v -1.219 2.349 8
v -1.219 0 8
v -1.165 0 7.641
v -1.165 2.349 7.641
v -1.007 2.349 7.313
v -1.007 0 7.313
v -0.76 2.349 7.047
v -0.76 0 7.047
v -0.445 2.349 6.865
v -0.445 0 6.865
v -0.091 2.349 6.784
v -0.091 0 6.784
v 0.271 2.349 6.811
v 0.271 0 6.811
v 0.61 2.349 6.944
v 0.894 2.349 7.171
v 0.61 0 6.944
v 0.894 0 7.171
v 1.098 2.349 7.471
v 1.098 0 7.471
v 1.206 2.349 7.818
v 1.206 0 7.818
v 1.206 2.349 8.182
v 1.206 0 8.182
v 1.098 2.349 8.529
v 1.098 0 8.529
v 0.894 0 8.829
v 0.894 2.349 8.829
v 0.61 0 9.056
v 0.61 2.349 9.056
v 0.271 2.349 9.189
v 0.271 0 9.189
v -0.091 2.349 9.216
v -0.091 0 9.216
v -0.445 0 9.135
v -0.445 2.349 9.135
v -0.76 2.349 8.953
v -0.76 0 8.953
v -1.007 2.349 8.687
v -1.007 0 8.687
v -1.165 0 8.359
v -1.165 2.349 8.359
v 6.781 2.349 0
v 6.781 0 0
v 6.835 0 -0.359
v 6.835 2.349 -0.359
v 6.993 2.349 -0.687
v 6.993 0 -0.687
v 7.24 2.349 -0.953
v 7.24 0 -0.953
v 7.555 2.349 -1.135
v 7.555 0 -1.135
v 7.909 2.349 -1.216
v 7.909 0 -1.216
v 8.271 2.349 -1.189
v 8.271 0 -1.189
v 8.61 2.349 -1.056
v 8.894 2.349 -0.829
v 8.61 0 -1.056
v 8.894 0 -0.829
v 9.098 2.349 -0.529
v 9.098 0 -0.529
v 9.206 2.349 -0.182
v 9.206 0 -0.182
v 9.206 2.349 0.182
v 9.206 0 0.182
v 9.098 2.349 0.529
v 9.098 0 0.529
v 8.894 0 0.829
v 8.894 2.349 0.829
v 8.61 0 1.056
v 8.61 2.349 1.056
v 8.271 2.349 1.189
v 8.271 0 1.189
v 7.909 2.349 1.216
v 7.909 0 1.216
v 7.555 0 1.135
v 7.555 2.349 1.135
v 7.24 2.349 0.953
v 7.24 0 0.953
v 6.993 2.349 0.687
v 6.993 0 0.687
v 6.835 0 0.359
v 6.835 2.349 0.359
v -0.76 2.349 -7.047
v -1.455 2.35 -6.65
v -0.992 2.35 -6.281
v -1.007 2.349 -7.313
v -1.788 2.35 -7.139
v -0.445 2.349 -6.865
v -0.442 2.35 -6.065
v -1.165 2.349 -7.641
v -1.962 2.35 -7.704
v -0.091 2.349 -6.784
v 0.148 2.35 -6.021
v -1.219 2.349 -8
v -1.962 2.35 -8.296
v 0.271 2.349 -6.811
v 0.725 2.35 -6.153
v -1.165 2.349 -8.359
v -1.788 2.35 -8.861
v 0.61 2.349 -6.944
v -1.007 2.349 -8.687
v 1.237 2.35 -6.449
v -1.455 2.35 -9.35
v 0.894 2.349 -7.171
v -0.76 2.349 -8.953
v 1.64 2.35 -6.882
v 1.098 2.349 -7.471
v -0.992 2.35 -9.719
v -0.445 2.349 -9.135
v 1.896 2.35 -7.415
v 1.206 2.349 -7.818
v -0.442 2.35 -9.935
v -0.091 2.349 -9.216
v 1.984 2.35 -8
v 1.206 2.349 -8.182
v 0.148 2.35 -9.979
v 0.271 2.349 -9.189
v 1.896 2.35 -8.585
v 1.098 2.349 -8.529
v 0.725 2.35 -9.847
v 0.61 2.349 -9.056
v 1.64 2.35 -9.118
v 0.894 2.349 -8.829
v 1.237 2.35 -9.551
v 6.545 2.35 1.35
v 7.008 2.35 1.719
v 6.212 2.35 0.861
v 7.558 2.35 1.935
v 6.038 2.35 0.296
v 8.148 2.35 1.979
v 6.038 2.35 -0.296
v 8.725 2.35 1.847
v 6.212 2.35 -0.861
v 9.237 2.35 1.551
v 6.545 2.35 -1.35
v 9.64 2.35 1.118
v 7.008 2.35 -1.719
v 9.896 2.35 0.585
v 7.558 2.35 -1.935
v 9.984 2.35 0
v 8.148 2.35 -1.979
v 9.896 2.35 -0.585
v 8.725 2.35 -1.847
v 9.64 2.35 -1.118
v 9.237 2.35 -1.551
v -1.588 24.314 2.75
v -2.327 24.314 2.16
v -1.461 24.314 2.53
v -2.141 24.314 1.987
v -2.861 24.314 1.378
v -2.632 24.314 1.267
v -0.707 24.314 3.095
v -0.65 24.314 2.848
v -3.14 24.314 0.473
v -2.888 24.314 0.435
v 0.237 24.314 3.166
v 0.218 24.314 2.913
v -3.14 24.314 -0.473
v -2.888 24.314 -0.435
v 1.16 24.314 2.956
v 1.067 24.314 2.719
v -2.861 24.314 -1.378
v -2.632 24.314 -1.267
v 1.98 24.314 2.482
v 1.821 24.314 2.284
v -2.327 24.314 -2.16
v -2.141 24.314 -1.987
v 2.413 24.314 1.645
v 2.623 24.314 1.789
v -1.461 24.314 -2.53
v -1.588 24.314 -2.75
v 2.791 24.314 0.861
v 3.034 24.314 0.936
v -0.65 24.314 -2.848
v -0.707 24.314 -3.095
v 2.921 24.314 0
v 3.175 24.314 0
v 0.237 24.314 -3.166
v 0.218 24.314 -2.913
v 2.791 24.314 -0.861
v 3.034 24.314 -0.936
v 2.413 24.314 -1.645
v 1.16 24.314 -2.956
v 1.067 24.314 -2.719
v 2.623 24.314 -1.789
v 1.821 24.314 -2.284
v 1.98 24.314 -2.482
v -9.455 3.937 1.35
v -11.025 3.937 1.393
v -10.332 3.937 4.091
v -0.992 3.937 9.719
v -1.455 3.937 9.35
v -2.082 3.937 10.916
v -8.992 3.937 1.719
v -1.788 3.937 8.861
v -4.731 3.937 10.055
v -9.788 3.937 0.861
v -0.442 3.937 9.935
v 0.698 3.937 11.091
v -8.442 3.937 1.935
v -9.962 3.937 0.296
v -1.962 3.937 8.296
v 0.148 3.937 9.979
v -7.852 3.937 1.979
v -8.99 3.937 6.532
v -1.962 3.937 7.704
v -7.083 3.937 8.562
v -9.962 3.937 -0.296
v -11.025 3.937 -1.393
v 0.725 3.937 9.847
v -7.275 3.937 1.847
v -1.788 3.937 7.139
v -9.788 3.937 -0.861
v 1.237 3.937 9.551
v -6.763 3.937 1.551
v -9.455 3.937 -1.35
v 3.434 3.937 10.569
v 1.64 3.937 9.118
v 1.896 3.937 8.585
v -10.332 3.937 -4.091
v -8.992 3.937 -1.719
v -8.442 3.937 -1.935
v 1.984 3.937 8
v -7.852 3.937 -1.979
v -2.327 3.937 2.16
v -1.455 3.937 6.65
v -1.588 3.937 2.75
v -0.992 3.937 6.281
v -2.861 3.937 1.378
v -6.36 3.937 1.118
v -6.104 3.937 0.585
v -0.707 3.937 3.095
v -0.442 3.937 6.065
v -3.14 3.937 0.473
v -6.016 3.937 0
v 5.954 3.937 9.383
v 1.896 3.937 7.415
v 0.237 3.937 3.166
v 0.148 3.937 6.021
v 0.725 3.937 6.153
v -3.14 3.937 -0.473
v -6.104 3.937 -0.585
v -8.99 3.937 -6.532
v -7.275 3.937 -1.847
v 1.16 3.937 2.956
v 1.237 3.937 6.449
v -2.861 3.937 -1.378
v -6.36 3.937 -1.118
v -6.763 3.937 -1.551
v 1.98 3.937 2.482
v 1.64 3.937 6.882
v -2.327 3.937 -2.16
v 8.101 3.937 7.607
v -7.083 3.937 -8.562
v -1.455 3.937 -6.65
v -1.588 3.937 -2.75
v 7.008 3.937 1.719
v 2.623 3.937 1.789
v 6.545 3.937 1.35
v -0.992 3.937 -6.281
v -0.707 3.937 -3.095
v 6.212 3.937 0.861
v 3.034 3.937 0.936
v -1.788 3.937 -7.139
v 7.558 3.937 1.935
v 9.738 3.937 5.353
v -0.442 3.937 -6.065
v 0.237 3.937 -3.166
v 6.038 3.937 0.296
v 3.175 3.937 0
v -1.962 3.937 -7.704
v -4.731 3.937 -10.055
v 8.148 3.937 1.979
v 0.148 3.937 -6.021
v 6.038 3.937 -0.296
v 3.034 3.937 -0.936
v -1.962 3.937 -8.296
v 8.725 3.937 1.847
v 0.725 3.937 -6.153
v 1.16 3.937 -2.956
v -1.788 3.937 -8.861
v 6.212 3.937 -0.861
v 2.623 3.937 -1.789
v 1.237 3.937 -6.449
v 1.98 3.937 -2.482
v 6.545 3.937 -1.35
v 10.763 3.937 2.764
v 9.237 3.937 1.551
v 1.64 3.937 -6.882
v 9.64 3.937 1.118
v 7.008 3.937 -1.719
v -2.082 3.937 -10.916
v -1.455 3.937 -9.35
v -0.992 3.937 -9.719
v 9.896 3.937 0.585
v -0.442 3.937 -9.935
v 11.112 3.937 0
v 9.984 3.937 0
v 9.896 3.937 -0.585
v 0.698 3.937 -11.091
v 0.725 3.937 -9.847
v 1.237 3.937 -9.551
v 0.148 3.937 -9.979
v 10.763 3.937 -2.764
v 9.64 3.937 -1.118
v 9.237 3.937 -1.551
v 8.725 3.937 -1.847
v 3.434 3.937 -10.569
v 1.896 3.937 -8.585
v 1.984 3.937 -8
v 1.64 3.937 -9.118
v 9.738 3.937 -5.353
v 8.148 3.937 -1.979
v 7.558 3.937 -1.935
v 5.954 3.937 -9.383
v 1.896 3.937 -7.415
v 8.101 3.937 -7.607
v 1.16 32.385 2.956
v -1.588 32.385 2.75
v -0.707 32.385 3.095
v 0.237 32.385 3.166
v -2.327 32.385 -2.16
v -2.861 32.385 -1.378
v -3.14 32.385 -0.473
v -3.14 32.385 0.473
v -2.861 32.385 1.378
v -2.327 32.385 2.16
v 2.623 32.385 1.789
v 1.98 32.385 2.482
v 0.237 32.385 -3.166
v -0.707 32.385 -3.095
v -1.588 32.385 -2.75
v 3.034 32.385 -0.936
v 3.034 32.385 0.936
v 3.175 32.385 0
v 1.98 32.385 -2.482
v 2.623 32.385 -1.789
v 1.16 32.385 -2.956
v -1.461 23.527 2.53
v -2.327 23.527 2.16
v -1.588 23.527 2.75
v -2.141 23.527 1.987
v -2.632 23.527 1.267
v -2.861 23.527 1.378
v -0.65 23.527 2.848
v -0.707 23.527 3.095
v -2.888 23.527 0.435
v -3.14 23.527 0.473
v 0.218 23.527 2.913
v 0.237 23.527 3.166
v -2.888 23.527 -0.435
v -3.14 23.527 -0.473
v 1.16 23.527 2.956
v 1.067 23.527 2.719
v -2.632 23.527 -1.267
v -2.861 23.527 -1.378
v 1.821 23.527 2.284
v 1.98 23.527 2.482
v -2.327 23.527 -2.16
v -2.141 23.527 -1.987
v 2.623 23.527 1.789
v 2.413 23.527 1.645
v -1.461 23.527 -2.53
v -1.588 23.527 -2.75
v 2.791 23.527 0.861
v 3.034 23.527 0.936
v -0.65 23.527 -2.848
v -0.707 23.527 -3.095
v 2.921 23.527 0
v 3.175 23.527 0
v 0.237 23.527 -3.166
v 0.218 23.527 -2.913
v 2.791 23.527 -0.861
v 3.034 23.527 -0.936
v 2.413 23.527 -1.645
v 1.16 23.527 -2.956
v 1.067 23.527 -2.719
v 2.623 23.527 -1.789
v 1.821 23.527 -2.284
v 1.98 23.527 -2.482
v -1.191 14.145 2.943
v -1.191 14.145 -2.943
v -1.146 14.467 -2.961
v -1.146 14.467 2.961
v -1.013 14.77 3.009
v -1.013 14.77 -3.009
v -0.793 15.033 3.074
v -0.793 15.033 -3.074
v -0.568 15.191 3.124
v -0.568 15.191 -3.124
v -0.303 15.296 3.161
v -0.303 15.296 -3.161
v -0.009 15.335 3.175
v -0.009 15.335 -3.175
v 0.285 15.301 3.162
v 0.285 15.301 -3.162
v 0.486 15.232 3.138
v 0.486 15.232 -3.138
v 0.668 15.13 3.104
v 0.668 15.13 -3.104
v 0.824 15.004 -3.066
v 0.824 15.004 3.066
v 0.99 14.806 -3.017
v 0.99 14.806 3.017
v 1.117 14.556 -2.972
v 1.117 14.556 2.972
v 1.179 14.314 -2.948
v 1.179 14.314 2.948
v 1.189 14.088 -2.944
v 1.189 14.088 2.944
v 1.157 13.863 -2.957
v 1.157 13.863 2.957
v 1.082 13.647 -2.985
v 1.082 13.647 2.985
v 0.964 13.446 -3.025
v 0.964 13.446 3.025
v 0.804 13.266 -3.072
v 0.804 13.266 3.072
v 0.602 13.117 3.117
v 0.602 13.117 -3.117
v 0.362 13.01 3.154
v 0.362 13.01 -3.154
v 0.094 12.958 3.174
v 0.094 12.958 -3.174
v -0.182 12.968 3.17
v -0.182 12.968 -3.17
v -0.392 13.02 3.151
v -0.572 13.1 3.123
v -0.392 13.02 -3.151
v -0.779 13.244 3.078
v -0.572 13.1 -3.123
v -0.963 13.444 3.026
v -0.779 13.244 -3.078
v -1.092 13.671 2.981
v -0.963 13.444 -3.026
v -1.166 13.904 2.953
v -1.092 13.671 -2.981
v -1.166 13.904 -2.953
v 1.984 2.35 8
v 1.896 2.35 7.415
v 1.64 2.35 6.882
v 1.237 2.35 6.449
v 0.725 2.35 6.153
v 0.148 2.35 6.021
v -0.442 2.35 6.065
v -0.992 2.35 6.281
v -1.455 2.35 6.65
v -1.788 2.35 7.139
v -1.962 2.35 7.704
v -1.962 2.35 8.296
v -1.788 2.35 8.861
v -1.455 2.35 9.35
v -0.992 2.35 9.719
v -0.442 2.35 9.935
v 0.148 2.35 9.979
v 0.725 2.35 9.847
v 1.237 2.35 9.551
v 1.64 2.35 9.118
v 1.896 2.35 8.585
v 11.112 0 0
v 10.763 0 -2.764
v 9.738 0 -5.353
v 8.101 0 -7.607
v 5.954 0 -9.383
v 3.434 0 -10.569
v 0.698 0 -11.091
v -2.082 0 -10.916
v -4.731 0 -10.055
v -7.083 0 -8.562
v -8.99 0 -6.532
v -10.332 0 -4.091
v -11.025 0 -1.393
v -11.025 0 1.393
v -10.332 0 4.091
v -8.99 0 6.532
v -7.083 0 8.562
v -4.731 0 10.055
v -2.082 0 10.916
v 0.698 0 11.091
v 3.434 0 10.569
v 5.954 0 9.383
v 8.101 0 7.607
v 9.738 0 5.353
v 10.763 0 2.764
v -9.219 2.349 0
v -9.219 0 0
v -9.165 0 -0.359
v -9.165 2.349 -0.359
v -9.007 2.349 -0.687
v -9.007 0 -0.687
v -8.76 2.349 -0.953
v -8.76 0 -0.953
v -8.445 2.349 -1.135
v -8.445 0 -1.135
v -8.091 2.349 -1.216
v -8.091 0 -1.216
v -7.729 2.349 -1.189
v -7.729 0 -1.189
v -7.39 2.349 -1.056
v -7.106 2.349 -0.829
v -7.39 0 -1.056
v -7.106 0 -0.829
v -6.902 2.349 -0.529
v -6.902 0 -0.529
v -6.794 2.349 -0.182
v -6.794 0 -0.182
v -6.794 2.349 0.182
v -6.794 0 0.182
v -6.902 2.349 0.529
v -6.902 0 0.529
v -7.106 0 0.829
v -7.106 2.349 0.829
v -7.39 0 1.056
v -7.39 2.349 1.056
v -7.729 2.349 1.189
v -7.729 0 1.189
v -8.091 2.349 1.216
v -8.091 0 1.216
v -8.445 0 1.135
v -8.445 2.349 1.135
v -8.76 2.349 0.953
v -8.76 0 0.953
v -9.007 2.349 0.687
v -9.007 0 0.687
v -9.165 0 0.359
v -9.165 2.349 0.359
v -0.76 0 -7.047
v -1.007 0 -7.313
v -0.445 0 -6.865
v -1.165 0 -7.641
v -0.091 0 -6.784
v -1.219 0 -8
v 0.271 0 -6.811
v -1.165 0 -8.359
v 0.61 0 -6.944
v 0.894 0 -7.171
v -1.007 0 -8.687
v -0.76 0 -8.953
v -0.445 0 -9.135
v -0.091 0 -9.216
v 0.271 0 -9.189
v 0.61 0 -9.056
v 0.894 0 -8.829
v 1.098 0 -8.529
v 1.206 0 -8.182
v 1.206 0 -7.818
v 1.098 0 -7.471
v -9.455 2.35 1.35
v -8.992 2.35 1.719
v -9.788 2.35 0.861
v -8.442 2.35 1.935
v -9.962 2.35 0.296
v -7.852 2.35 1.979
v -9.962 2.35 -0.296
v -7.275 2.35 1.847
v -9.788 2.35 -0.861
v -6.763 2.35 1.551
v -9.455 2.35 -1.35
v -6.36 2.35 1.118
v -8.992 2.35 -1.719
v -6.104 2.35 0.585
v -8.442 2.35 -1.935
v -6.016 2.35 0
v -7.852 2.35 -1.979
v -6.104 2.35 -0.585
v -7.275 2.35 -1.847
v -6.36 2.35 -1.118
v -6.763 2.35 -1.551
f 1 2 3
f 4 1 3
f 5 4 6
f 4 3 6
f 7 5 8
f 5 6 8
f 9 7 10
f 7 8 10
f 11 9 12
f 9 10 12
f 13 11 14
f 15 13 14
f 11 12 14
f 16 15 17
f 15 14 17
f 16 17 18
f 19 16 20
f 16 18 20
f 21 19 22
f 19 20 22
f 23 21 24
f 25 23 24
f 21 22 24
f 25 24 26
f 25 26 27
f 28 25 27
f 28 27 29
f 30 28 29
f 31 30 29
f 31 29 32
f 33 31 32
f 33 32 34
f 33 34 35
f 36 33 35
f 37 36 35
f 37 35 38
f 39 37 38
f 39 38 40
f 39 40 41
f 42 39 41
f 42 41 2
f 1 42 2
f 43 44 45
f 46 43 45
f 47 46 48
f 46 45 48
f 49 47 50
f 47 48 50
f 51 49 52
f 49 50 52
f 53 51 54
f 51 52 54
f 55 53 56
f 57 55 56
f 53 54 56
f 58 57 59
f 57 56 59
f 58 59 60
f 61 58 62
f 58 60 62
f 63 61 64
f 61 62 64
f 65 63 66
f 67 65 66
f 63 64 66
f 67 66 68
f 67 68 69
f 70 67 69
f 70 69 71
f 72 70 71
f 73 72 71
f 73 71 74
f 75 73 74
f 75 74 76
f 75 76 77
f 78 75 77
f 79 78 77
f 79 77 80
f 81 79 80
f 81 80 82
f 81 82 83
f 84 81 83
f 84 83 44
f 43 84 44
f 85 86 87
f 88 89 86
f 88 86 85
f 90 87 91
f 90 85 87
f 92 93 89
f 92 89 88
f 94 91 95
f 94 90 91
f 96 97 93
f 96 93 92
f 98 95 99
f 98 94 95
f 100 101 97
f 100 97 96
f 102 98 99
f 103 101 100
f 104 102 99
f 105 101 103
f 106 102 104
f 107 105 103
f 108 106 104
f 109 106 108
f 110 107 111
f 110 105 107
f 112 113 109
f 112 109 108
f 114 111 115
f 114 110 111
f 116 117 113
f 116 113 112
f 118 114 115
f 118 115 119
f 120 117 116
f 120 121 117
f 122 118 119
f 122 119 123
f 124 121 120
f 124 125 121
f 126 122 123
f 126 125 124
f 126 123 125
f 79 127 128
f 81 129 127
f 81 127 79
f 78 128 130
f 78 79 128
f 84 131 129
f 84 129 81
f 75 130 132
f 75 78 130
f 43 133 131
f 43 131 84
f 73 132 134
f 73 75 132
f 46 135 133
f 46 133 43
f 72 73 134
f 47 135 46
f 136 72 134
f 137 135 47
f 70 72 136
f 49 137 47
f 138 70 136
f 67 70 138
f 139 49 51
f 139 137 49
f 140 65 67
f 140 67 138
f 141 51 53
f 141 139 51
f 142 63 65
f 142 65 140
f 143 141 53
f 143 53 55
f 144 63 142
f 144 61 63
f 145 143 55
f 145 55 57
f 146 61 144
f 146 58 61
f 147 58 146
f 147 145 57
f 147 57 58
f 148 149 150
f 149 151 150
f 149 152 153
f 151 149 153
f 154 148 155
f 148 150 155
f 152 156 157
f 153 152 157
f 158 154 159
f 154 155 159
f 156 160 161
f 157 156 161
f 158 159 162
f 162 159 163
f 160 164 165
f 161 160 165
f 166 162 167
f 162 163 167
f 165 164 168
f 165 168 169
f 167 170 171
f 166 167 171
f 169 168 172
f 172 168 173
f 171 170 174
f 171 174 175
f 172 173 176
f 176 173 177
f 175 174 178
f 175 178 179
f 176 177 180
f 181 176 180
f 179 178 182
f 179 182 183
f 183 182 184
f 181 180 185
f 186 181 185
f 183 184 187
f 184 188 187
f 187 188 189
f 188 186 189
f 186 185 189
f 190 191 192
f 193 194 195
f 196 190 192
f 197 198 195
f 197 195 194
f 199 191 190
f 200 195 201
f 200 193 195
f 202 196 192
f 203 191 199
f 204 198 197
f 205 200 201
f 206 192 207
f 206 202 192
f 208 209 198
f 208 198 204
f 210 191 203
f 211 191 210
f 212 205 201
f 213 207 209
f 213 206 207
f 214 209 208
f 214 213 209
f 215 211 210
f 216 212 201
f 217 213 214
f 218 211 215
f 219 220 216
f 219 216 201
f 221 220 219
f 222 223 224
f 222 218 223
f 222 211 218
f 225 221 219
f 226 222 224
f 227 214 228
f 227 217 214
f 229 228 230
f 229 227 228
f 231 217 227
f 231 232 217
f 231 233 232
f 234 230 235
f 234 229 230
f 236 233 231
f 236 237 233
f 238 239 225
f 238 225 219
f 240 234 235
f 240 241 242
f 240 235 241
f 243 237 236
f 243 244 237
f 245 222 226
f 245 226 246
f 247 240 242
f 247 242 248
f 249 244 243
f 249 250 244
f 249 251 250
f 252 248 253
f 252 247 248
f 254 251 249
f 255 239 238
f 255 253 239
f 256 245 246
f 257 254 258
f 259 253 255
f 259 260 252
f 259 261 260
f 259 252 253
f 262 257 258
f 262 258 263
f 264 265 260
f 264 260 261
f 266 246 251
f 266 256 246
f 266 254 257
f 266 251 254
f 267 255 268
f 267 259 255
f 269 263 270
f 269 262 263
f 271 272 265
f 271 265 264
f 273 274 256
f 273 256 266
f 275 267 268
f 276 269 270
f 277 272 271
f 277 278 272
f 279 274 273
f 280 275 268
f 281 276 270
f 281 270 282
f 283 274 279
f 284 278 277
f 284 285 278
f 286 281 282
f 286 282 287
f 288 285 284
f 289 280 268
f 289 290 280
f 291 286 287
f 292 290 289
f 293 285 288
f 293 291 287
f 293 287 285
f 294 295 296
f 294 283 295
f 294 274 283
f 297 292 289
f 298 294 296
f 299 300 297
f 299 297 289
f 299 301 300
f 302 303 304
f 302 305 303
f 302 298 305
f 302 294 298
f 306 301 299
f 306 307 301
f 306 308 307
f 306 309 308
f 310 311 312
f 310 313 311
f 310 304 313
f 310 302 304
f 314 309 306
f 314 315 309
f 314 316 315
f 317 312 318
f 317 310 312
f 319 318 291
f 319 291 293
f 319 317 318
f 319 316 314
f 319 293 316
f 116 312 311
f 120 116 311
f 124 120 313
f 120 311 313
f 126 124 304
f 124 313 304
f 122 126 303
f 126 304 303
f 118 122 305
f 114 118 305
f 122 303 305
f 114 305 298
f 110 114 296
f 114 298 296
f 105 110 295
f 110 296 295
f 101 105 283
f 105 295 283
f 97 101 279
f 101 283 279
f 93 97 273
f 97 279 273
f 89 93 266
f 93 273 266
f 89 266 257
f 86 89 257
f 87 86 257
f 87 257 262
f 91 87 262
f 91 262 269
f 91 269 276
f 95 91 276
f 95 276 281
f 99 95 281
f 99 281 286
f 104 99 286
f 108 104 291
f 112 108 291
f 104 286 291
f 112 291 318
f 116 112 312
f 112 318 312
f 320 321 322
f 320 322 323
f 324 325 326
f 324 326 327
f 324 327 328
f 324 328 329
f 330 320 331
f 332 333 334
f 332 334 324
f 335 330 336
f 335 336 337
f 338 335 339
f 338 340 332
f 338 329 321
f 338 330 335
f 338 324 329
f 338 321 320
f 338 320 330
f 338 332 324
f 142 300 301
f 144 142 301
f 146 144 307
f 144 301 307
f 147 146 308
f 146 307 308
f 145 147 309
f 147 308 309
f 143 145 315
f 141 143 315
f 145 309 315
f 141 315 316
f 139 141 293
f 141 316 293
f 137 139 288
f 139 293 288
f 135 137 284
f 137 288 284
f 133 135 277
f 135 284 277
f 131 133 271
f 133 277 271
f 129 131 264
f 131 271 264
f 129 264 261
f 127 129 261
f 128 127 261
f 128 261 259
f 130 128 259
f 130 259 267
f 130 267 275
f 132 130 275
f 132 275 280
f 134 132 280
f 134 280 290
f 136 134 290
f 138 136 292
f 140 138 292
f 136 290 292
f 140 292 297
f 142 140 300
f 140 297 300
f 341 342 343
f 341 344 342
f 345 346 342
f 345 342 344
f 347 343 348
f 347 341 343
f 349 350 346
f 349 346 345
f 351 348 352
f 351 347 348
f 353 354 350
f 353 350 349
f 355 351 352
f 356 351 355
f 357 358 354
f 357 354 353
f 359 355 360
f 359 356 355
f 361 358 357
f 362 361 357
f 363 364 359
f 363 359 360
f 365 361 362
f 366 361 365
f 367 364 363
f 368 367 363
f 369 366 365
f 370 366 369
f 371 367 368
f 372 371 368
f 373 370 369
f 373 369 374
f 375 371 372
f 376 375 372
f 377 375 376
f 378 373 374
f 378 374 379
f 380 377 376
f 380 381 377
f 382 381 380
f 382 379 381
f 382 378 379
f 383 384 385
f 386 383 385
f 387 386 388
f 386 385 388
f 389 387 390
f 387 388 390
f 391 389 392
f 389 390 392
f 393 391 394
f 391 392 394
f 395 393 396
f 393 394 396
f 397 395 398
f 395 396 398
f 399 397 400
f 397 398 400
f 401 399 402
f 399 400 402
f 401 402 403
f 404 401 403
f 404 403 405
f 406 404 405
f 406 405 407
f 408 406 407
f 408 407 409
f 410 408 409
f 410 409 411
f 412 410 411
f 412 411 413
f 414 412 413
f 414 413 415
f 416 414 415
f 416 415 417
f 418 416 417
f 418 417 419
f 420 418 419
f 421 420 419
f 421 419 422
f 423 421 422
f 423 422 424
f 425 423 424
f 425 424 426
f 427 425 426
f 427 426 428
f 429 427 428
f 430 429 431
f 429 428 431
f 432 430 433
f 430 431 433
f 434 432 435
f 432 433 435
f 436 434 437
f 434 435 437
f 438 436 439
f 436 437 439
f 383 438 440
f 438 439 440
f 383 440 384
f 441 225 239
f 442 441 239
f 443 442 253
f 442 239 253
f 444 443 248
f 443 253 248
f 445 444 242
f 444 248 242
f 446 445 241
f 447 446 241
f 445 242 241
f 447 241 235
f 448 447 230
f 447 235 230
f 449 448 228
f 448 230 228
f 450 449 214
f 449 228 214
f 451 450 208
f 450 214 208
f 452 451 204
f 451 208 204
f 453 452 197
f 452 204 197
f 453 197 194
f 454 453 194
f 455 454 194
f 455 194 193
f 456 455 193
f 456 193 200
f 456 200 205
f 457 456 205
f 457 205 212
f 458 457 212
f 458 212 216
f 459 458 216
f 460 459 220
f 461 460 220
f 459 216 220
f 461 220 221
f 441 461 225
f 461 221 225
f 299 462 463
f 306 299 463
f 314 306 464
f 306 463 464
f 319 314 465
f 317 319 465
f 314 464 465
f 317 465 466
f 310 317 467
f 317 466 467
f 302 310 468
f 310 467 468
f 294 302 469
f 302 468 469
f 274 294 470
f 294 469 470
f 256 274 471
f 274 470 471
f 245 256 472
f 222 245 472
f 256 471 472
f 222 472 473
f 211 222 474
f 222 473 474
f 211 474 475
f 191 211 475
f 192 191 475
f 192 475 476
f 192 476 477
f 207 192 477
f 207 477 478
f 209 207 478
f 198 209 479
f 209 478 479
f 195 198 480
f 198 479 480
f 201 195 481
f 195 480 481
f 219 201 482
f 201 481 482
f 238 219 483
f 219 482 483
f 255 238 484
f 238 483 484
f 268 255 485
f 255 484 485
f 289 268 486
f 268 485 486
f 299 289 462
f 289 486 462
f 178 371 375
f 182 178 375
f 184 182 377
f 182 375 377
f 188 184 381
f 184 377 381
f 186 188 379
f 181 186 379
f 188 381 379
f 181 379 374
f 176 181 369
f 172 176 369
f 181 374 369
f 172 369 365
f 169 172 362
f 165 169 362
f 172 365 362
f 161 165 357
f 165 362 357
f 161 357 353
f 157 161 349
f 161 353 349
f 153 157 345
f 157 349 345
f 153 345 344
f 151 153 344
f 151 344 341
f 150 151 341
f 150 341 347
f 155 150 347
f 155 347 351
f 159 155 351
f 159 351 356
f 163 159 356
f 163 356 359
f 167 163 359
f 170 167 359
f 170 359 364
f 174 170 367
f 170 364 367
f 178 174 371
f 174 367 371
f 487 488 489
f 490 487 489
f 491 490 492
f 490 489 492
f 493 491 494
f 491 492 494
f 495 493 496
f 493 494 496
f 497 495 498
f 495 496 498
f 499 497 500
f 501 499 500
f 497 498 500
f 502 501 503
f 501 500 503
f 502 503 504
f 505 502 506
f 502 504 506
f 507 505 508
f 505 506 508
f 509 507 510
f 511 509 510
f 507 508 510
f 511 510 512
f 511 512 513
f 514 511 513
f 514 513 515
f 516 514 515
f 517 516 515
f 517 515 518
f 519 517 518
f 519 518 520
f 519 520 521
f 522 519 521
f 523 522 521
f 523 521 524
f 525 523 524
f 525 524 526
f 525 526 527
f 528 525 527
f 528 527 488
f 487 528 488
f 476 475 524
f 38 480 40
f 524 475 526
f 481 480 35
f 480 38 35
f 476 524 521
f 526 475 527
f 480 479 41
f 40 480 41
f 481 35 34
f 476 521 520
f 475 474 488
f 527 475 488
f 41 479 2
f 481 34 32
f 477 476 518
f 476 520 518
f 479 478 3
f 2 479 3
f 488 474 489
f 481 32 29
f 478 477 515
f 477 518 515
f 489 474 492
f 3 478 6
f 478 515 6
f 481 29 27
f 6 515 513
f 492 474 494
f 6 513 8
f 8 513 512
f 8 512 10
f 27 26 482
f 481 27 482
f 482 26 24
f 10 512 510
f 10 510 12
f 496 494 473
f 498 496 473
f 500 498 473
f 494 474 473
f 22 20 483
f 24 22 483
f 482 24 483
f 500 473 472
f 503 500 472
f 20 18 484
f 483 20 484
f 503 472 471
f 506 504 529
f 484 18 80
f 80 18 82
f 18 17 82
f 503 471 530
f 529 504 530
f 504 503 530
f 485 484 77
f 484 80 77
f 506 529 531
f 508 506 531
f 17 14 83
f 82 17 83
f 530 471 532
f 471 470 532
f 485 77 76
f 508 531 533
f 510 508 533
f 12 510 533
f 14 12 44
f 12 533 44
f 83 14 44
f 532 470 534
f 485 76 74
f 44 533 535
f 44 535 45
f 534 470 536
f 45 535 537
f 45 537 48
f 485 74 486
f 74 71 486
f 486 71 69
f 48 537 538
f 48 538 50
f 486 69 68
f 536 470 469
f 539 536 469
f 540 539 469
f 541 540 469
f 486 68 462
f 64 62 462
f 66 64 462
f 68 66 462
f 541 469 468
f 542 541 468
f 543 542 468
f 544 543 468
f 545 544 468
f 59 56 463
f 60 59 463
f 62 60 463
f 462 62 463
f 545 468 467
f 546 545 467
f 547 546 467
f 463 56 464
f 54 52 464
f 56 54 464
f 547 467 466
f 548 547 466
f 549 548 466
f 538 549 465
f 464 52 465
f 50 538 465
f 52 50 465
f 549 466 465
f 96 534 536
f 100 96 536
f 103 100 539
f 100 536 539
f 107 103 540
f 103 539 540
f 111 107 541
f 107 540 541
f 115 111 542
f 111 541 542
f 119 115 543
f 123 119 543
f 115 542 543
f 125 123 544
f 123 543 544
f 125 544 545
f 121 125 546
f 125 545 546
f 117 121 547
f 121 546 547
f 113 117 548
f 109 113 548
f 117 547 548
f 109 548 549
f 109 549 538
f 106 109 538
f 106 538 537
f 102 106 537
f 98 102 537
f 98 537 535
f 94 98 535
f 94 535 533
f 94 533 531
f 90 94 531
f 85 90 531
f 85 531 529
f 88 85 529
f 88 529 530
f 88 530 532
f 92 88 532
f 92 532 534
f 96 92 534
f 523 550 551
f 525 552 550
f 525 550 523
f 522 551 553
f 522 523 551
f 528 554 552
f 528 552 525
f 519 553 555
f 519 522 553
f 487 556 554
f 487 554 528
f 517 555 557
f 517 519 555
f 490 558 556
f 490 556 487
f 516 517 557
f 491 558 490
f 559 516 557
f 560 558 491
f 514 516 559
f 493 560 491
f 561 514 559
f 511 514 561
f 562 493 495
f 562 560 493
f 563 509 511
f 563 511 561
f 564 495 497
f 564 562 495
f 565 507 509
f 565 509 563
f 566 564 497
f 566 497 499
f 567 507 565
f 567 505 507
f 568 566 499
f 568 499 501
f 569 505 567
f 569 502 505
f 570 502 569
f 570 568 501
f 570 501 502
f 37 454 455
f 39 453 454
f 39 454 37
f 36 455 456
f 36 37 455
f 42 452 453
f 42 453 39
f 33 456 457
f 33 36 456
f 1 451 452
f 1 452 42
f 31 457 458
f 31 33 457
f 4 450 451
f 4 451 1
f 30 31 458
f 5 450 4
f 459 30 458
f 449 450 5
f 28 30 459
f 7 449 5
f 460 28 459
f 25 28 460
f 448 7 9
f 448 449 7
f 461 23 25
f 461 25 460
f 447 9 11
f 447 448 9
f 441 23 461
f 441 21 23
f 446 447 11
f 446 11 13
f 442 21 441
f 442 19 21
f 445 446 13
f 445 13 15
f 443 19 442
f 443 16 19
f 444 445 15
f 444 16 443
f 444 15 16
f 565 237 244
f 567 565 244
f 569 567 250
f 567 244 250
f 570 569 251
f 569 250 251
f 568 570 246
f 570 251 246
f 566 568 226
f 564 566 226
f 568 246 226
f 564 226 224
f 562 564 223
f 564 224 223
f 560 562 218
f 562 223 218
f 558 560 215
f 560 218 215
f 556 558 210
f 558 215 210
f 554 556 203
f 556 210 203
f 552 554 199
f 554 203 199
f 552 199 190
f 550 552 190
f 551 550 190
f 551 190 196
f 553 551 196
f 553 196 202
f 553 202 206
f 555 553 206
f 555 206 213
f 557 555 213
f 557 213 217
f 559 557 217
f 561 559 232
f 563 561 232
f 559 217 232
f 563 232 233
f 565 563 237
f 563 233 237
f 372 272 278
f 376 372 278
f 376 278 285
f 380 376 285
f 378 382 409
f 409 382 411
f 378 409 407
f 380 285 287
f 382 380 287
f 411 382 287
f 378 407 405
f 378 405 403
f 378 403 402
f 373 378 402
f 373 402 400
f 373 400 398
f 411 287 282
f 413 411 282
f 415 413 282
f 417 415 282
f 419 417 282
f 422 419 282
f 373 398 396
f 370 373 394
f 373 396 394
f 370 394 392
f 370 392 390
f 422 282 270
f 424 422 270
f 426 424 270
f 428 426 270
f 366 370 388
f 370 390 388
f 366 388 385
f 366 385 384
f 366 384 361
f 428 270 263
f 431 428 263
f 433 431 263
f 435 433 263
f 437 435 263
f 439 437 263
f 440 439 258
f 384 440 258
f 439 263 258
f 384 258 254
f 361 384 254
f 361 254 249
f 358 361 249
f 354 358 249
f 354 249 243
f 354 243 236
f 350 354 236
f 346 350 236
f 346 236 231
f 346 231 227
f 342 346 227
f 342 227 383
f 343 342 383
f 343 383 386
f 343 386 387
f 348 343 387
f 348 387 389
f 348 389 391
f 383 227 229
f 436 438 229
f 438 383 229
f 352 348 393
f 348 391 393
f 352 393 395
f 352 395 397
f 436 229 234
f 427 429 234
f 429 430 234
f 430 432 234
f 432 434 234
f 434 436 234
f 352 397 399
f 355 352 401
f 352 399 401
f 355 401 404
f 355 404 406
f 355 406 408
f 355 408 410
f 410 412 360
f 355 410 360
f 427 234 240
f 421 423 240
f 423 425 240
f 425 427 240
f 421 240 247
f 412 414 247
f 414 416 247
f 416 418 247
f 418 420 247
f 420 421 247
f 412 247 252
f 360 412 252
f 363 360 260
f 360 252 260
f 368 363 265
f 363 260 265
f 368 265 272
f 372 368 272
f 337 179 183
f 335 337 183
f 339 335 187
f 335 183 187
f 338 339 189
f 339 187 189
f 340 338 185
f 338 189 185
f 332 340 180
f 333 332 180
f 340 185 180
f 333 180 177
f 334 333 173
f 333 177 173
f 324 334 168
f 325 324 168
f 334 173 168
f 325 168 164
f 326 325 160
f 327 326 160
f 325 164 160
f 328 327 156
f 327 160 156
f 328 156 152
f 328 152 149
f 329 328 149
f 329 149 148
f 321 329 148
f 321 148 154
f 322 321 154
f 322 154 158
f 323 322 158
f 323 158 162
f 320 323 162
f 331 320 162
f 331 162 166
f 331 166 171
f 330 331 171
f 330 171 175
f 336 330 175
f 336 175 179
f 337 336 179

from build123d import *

# Parameters (mm, degrees)
SKETCH1_R                       = 11.1125
BOSS_EXTRUDE1_DEPTH             = 3.937
BOSS_EXTRUDE2_START             = -3.937
SKETCH2_R                       = 3.175
BOSS_EXTRUDE2_DEPTH             = 32.385
F_2_CLEARANCE_HOLE1_D           = 2.4384
SKETCH5_R                       = 1.984375
CUT_EXTRUDE1_DEPTH              = 1.5875
F_3_32_0_09375_DIAMETER_HOLE1_D = 2.38125
CUT_EXTRUDE2_START              = -8.85825
SKETCH9_R                       = 3.175
SKETCH9_R_2                     = 2.921
CUT_EXTRUDE2_DEPTH              = 0.7874


with BuildPart() as part:
    # Sketch1 → Boss-Extrude1 (new body)
    with BuildSketch(Plane(origin=(0, 0, 0), x_dir=(1, 0, 0), z_dir=(0, 1, 0))):
        Circle(SKETCH1_R)
    extrude(amount=BOSS_EXTRUDE1_DEPTH)

    # Sketch2 → Boss-Extrude2 (add)
    with BuildSketch(Plane(origin=(0, 3.937, 0), x_dir=(1, 0, 0), z_dir=(0, 1, 0)).offset(BOSS_EXTRUDE2_START)):
        Circle(SKETCH2_R)
    extrude(amount=BOSS_EXTRUDE2_DEPTH)

    # #2 Clearance Hole1 (through all)
    with Locations(Plane(origin=(0, 3.937, 0), x_dir=(1, 0, 0), z_dir=(0, 1, 0))):
        with Locations((0, -8), (0, 8), (-8, 0), (8, 0)):
            Hole(F_2_CLEARANCE_HOLE1_D / 2)

    # Sketch5 → Cut-Extrude1 (cut)
    with BuildSketch(Plane(origin=(0, 3.937, 0), x_dir=(1, 0, 0), z_dir=(0, 1, 0))):
        with Locations((0, -8)):
            Circle(SKETCH5_R)
        with Locations((8, 0)):
            Circle(SKETCH5_R)
        with Locations((0, 8)):
            Circle(SKETCH5_R)
        with Locations((-8, 0)):
            Circle(SKETCH5_R)
    extrude(amount=-CUT_EXTRUDE1_DEPTH, mode=Mode.SUBTRACT)

    # 3/32 (0.09375) Diameter Hole1 (through all)
    with Locations(Plane.XY.offset(3.175)):
        with Locations((0, 14.144625)):
            Hole(F_3_32_0_09375_DIAMETER_HOLE1_D / 2)

    # Sketch9 → Cut-Extrude2 (cut)
    with BuildSketch(Plane(origin=(0, 32.385, 0), x_dir=(1, 0, 0), z_dir=(0, 1, 0)).offset(CUT_EXTRUDE2_START)):
        Circle(SKETCH9_R)
        Circle(SKETCH9_R_2, mode=Mode.SUBTRACT)
    extrude(amount=CUT_EXTRUDE2_DEPTH, mode=Mode.SUBTRACT)


solid = part.part
